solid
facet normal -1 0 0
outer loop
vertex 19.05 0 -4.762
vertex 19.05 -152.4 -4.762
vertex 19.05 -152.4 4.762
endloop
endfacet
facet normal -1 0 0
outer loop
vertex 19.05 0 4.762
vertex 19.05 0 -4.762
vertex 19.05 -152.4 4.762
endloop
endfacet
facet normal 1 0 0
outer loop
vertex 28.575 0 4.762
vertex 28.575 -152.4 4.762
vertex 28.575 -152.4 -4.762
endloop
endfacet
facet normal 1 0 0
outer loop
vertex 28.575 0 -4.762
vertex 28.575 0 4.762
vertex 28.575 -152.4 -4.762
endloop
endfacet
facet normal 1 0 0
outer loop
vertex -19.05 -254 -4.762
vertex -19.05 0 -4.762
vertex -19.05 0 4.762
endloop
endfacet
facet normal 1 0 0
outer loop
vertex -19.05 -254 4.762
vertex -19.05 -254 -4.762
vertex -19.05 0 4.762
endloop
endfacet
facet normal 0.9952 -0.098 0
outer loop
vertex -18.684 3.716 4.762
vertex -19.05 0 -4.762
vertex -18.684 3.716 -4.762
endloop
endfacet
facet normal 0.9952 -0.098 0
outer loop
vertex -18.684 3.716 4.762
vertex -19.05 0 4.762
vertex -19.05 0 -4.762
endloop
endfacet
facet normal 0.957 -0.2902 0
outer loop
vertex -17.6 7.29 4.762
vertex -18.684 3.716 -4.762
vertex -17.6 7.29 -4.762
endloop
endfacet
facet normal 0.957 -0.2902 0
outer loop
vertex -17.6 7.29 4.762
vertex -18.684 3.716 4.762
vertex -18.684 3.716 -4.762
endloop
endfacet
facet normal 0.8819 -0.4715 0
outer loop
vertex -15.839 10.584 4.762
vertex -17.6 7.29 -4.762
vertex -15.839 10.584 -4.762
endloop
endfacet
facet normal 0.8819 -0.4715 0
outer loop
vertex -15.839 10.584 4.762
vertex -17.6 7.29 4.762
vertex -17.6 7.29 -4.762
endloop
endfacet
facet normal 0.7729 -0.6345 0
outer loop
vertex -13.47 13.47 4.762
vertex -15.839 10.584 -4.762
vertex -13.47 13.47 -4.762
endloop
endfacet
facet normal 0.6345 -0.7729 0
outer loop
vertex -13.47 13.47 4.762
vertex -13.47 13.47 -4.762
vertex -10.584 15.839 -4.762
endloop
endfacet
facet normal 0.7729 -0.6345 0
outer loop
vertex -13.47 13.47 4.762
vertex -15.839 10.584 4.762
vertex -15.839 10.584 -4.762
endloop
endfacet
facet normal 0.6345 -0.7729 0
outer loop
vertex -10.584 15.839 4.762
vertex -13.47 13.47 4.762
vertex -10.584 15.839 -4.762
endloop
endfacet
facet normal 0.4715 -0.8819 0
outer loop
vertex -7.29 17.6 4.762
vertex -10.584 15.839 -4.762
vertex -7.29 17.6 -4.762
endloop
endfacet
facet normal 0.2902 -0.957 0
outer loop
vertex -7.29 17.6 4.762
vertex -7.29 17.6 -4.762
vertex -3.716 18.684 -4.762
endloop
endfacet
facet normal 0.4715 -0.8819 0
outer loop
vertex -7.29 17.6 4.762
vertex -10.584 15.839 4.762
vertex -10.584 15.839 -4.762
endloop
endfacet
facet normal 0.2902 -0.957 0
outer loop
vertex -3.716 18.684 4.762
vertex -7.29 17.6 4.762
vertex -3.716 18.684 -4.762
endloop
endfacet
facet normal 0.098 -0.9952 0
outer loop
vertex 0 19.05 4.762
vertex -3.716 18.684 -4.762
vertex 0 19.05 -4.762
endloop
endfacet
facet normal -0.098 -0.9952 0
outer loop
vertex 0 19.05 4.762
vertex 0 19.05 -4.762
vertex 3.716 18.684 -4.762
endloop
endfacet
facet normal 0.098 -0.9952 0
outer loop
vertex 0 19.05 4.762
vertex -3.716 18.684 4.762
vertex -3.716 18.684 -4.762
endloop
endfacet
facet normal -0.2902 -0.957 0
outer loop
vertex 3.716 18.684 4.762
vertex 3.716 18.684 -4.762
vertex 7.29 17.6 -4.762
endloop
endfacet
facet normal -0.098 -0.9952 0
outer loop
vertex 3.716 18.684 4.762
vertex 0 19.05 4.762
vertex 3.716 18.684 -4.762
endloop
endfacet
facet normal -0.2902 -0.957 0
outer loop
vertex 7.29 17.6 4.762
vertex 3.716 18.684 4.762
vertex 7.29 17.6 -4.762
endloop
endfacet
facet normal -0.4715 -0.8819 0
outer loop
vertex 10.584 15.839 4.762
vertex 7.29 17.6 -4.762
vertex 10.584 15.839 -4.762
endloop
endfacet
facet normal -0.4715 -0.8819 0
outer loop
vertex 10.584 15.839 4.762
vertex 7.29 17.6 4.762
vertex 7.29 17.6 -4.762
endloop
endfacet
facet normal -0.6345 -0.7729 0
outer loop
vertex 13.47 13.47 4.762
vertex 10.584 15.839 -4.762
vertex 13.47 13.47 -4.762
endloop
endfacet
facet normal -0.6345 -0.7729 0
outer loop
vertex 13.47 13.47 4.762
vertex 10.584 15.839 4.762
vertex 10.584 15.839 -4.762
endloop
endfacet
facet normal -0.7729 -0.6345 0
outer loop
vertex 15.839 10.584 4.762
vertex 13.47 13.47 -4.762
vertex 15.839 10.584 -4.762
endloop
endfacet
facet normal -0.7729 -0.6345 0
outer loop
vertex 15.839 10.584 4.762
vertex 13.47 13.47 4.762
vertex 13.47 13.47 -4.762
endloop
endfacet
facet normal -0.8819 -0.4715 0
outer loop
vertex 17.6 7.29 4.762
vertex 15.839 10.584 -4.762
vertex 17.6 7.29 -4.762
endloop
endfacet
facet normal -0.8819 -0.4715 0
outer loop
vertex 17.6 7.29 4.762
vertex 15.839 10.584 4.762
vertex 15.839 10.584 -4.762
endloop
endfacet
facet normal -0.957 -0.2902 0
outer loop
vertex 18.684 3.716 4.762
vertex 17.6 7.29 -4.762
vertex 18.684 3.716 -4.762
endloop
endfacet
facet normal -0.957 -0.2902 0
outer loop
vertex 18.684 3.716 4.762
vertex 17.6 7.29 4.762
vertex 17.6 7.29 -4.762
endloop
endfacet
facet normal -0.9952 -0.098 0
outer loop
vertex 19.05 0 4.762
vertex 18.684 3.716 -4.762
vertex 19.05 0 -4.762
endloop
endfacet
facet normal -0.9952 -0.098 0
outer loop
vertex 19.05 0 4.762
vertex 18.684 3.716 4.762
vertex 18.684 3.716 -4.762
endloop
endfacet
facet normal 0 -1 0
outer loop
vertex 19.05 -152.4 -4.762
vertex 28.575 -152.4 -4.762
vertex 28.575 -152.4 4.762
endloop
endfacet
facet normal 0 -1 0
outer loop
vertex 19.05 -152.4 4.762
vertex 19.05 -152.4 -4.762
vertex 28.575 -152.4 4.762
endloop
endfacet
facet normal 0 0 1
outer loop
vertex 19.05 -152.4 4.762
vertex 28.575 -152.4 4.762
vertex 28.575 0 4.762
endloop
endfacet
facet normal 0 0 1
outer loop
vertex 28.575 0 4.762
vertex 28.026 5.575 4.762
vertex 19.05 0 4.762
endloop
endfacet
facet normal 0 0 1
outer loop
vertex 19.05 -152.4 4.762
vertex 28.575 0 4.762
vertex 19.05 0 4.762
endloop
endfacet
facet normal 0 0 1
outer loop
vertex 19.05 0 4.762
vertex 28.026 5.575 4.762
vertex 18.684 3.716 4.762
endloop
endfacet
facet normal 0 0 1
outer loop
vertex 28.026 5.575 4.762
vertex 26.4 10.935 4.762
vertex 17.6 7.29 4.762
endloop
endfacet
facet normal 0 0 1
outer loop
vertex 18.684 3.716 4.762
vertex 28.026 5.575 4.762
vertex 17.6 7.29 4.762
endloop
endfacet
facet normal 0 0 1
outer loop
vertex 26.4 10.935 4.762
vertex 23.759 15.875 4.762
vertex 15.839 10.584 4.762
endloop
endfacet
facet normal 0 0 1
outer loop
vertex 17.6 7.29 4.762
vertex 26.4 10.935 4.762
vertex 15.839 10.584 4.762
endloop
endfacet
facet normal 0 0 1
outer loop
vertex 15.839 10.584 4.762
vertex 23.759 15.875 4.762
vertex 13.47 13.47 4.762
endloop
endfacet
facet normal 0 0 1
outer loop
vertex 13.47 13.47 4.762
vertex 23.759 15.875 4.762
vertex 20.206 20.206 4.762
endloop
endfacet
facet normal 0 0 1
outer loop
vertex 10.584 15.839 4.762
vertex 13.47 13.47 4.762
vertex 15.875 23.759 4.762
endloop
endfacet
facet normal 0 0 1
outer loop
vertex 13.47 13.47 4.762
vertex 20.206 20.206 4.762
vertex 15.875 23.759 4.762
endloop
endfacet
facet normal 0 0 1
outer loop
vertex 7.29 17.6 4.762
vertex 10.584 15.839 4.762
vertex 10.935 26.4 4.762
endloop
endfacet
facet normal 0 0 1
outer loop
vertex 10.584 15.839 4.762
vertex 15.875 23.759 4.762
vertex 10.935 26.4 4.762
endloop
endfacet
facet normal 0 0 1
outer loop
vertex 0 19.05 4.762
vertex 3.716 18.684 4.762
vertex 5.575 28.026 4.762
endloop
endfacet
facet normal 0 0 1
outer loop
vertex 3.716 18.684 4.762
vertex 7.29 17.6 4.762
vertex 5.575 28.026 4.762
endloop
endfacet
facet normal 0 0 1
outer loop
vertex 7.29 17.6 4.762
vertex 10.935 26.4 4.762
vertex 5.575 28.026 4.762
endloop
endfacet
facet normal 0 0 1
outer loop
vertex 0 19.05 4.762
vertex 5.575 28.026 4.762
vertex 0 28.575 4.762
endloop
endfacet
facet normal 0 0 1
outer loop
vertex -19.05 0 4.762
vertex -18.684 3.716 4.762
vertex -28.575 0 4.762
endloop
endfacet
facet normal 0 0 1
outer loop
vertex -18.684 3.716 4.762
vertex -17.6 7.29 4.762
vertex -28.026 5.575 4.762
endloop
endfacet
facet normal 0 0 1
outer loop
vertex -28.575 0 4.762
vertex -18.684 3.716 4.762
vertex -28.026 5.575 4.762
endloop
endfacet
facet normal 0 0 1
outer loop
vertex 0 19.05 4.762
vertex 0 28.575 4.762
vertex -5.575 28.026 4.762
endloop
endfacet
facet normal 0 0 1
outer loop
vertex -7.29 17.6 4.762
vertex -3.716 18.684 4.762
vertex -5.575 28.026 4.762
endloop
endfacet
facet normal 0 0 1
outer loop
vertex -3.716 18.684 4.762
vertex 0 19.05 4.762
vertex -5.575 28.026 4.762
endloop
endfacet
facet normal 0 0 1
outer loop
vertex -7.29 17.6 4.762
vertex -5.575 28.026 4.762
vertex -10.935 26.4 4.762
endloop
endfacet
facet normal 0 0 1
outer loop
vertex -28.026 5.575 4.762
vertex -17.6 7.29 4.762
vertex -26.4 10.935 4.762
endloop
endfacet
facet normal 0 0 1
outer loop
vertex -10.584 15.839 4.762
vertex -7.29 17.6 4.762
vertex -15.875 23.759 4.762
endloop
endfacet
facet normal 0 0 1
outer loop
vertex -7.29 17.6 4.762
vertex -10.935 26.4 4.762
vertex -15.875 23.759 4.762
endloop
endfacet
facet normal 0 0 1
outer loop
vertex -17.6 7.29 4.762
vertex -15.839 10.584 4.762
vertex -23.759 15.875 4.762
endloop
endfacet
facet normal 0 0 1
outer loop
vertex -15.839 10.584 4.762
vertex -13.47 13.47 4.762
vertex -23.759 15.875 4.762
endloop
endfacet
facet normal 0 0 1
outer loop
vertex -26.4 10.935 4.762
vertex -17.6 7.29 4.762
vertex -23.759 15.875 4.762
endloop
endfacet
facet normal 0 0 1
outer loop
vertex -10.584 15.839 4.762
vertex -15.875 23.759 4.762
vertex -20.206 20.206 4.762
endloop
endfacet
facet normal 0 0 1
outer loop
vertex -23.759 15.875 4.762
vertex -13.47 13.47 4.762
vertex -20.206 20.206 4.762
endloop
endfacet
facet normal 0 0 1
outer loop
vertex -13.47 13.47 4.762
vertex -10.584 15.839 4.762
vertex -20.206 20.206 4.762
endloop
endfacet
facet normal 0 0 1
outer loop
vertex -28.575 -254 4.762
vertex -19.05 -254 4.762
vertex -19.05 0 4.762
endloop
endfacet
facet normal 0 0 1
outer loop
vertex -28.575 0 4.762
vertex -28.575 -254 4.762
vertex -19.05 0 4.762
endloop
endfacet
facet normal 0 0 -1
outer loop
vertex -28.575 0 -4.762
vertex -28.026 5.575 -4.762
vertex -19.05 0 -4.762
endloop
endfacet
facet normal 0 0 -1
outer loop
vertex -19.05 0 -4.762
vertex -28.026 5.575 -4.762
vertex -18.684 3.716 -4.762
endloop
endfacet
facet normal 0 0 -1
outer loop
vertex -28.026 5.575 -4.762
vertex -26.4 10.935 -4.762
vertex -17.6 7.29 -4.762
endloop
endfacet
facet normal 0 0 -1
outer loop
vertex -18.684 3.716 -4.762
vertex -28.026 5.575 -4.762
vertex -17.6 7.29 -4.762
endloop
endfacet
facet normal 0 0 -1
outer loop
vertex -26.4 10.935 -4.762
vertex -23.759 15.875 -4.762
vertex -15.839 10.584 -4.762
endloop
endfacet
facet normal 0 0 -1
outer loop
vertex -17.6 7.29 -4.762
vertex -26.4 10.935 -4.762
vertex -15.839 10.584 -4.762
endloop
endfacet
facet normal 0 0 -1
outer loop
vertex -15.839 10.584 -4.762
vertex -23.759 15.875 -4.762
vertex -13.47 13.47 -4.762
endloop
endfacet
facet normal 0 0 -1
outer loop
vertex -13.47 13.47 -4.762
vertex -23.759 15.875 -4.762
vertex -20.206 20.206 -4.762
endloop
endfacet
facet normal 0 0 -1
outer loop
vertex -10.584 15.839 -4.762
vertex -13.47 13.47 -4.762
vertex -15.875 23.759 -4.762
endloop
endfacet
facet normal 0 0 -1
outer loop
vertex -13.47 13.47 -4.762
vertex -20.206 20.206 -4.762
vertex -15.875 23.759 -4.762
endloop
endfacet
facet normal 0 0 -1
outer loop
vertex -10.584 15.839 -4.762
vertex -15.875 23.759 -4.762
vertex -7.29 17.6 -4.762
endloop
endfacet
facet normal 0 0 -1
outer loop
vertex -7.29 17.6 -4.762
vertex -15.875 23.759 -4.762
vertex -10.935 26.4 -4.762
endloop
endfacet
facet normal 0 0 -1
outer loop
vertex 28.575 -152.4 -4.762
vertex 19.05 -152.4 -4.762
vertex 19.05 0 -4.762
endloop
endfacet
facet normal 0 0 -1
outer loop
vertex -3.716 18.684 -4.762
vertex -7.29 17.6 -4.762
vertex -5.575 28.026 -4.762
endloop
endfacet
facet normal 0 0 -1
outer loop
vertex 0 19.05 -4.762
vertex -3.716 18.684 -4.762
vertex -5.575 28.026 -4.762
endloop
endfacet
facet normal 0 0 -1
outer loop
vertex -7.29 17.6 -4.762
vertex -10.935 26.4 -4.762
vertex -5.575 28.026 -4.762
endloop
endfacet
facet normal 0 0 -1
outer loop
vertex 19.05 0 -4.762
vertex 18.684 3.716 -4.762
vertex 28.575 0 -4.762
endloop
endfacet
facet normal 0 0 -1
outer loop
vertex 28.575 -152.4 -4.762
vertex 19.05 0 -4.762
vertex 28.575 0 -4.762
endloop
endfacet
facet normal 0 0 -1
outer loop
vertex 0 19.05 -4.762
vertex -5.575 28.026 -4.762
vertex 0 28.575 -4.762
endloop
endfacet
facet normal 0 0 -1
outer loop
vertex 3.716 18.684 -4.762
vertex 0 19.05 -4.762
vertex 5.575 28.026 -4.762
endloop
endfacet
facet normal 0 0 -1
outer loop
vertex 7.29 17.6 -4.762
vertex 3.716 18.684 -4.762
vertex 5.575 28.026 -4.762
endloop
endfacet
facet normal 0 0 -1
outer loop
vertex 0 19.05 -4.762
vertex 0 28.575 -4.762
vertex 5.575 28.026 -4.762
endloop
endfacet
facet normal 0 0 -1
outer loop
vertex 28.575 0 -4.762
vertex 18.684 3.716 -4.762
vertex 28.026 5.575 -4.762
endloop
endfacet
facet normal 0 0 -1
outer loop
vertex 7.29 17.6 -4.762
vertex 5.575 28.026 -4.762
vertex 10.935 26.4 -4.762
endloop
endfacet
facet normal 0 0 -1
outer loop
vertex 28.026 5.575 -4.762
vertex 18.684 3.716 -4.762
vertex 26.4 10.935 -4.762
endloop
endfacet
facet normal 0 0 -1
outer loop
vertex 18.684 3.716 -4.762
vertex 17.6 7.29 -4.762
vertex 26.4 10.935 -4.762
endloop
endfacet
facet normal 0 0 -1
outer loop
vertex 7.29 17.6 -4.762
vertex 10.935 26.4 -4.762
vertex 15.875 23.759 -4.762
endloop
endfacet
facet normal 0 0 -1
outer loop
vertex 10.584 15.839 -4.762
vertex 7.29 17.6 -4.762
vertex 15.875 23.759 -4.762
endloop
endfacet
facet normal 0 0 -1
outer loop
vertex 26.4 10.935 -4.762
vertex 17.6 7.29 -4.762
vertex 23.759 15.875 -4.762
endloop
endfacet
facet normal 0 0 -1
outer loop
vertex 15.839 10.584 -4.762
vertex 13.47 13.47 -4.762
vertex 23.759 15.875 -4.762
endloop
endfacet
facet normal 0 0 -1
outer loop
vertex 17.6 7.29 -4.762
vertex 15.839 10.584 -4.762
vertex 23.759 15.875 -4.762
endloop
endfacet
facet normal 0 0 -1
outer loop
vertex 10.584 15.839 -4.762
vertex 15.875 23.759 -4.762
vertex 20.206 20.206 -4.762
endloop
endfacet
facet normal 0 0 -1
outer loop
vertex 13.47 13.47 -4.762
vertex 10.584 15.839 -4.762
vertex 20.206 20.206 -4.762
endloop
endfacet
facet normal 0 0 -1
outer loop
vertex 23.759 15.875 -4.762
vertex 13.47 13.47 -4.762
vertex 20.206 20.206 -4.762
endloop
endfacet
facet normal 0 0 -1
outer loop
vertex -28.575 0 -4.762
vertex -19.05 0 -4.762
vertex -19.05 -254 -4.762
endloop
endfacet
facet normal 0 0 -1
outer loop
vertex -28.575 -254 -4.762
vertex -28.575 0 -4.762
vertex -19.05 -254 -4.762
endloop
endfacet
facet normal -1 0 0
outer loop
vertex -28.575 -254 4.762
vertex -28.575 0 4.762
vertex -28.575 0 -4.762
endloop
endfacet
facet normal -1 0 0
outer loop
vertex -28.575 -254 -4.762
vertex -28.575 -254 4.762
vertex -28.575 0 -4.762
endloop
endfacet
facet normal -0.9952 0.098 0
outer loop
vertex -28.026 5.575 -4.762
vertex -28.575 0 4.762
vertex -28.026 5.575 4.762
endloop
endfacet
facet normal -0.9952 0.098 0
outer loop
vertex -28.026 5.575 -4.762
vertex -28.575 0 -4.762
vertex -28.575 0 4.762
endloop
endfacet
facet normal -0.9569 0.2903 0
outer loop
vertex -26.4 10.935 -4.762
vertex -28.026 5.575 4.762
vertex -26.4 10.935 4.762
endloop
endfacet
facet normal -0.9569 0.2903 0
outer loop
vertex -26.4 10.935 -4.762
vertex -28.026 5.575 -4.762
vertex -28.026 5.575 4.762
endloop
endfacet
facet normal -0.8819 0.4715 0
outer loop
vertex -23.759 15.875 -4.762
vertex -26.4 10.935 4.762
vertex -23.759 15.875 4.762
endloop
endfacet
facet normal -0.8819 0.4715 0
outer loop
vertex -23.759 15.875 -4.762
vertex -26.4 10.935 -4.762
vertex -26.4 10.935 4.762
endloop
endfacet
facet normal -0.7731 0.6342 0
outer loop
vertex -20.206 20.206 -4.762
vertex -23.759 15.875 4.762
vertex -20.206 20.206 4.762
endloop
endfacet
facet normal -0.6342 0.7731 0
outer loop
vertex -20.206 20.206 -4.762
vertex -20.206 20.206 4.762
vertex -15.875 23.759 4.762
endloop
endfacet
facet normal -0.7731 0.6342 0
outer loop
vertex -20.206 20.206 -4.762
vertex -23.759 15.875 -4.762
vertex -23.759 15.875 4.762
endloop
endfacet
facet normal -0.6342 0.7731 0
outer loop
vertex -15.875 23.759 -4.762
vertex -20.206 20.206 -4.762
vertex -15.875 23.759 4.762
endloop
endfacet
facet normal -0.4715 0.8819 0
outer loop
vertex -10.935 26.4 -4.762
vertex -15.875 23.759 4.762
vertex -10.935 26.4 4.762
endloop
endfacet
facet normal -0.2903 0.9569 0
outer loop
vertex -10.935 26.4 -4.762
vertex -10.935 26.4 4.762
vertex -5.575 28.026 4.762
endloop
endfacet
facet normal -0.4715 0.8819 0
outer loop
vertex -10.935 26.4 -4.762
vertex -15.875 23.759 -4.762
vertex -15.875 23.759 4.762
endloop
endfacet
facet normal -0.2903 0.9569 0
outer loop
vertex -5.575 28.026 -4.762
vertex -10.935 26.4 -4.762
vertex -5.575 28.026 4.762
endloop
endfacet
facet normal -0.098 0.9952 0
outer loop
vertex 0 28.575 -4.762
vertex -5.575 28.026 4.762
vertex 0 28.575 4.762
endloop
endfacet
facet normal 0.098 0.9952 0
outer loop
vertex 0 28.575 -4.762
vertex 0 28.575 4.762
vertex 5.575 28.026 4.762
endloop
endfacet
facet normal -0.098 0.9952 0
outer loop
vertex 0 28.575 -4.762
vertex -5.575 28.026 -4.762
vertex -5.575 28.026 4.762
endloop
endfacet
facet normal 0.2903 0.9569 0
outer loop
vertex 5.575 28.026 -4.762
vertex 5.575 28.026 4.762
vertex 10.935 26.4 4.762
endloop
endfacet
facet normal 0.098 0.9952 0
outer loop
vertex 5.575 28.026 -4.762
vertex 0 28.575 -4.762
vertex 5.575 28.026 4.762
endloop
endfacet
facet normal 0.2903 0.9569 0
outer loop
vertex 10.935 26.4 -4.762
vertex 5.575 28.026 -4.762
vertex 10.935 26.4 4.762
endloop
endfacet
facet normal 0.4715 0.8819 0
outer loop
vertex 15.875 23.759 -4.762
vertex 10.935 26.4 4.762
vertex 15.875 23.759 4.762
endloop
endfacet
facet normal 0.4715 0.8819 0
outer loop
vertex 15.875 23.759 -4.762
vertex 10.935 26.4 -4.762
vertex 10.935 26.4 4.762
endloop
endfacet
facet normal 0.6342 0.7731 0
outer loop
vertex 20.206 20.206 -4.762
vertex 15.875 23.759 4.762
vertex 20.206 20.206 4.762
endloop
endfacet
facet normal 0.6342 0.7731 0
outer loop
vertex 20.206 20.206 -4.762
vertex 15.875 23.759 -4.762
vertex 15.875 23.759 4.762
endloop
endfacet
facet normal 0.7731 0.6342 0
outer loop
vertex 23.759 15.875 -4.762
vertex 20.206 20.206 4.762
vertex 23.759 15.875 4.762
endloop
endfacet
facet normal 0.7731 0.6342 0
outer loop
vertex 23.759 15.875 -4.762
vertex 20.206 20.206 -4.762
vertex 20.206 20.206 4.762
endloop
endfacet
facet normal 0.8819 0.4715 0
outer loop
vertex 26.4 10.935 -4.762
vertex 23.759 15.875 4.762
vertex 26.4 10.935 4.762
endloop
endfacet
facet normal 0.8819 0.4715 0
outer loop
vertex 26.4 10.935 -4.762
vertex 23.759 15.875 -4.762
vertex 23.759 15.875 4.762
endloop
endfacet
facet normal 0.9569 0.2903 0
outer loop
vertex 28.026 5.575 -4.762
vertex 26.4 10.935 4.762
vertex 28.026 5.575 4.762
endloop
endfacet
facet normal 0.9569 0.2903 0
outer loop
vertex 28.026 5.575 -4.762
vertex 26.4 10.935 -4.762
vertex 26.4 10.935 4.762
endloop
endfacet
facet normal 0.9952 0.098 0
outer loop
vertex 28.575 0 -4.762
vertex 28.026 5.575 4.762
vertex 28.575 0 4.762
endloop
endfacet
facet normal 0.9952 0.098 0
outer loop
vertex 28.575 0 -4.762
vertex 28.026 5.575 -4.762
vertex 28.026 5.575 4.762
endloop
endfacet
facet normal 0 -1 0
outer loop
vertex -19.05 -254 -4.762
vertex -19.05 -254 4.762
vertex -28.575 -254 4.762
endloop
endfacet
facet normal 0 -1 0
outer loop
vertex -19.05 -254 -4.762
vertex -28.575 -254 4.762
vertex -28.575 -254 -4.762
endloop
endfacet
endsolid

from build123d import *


with BuildPart() as f3:
    # F3: sweep along a path in F0
    with BuildLine(Plane.XY) as f3_path:
        Line((-23.8125, -254), (-23.8125, 0))
        ThreePointArc((-23.8125, 0), (0, 23.8125), (23.8125, 0))
        Line((23.8125, 0), (23.8125, -152.4))
    # F2 (on offset) → F3 (sweep)
    with BuildSketch(Plane.XZ.offset(254)):
        Polygon((-19.05, 4.7625), (-28.575, 4.7625), (-28.575, -4.7625), (-19.05, -4.7625), (-19.05, 0), align=None)
    sweep(path=f3_path.line)


solid = f3.part
